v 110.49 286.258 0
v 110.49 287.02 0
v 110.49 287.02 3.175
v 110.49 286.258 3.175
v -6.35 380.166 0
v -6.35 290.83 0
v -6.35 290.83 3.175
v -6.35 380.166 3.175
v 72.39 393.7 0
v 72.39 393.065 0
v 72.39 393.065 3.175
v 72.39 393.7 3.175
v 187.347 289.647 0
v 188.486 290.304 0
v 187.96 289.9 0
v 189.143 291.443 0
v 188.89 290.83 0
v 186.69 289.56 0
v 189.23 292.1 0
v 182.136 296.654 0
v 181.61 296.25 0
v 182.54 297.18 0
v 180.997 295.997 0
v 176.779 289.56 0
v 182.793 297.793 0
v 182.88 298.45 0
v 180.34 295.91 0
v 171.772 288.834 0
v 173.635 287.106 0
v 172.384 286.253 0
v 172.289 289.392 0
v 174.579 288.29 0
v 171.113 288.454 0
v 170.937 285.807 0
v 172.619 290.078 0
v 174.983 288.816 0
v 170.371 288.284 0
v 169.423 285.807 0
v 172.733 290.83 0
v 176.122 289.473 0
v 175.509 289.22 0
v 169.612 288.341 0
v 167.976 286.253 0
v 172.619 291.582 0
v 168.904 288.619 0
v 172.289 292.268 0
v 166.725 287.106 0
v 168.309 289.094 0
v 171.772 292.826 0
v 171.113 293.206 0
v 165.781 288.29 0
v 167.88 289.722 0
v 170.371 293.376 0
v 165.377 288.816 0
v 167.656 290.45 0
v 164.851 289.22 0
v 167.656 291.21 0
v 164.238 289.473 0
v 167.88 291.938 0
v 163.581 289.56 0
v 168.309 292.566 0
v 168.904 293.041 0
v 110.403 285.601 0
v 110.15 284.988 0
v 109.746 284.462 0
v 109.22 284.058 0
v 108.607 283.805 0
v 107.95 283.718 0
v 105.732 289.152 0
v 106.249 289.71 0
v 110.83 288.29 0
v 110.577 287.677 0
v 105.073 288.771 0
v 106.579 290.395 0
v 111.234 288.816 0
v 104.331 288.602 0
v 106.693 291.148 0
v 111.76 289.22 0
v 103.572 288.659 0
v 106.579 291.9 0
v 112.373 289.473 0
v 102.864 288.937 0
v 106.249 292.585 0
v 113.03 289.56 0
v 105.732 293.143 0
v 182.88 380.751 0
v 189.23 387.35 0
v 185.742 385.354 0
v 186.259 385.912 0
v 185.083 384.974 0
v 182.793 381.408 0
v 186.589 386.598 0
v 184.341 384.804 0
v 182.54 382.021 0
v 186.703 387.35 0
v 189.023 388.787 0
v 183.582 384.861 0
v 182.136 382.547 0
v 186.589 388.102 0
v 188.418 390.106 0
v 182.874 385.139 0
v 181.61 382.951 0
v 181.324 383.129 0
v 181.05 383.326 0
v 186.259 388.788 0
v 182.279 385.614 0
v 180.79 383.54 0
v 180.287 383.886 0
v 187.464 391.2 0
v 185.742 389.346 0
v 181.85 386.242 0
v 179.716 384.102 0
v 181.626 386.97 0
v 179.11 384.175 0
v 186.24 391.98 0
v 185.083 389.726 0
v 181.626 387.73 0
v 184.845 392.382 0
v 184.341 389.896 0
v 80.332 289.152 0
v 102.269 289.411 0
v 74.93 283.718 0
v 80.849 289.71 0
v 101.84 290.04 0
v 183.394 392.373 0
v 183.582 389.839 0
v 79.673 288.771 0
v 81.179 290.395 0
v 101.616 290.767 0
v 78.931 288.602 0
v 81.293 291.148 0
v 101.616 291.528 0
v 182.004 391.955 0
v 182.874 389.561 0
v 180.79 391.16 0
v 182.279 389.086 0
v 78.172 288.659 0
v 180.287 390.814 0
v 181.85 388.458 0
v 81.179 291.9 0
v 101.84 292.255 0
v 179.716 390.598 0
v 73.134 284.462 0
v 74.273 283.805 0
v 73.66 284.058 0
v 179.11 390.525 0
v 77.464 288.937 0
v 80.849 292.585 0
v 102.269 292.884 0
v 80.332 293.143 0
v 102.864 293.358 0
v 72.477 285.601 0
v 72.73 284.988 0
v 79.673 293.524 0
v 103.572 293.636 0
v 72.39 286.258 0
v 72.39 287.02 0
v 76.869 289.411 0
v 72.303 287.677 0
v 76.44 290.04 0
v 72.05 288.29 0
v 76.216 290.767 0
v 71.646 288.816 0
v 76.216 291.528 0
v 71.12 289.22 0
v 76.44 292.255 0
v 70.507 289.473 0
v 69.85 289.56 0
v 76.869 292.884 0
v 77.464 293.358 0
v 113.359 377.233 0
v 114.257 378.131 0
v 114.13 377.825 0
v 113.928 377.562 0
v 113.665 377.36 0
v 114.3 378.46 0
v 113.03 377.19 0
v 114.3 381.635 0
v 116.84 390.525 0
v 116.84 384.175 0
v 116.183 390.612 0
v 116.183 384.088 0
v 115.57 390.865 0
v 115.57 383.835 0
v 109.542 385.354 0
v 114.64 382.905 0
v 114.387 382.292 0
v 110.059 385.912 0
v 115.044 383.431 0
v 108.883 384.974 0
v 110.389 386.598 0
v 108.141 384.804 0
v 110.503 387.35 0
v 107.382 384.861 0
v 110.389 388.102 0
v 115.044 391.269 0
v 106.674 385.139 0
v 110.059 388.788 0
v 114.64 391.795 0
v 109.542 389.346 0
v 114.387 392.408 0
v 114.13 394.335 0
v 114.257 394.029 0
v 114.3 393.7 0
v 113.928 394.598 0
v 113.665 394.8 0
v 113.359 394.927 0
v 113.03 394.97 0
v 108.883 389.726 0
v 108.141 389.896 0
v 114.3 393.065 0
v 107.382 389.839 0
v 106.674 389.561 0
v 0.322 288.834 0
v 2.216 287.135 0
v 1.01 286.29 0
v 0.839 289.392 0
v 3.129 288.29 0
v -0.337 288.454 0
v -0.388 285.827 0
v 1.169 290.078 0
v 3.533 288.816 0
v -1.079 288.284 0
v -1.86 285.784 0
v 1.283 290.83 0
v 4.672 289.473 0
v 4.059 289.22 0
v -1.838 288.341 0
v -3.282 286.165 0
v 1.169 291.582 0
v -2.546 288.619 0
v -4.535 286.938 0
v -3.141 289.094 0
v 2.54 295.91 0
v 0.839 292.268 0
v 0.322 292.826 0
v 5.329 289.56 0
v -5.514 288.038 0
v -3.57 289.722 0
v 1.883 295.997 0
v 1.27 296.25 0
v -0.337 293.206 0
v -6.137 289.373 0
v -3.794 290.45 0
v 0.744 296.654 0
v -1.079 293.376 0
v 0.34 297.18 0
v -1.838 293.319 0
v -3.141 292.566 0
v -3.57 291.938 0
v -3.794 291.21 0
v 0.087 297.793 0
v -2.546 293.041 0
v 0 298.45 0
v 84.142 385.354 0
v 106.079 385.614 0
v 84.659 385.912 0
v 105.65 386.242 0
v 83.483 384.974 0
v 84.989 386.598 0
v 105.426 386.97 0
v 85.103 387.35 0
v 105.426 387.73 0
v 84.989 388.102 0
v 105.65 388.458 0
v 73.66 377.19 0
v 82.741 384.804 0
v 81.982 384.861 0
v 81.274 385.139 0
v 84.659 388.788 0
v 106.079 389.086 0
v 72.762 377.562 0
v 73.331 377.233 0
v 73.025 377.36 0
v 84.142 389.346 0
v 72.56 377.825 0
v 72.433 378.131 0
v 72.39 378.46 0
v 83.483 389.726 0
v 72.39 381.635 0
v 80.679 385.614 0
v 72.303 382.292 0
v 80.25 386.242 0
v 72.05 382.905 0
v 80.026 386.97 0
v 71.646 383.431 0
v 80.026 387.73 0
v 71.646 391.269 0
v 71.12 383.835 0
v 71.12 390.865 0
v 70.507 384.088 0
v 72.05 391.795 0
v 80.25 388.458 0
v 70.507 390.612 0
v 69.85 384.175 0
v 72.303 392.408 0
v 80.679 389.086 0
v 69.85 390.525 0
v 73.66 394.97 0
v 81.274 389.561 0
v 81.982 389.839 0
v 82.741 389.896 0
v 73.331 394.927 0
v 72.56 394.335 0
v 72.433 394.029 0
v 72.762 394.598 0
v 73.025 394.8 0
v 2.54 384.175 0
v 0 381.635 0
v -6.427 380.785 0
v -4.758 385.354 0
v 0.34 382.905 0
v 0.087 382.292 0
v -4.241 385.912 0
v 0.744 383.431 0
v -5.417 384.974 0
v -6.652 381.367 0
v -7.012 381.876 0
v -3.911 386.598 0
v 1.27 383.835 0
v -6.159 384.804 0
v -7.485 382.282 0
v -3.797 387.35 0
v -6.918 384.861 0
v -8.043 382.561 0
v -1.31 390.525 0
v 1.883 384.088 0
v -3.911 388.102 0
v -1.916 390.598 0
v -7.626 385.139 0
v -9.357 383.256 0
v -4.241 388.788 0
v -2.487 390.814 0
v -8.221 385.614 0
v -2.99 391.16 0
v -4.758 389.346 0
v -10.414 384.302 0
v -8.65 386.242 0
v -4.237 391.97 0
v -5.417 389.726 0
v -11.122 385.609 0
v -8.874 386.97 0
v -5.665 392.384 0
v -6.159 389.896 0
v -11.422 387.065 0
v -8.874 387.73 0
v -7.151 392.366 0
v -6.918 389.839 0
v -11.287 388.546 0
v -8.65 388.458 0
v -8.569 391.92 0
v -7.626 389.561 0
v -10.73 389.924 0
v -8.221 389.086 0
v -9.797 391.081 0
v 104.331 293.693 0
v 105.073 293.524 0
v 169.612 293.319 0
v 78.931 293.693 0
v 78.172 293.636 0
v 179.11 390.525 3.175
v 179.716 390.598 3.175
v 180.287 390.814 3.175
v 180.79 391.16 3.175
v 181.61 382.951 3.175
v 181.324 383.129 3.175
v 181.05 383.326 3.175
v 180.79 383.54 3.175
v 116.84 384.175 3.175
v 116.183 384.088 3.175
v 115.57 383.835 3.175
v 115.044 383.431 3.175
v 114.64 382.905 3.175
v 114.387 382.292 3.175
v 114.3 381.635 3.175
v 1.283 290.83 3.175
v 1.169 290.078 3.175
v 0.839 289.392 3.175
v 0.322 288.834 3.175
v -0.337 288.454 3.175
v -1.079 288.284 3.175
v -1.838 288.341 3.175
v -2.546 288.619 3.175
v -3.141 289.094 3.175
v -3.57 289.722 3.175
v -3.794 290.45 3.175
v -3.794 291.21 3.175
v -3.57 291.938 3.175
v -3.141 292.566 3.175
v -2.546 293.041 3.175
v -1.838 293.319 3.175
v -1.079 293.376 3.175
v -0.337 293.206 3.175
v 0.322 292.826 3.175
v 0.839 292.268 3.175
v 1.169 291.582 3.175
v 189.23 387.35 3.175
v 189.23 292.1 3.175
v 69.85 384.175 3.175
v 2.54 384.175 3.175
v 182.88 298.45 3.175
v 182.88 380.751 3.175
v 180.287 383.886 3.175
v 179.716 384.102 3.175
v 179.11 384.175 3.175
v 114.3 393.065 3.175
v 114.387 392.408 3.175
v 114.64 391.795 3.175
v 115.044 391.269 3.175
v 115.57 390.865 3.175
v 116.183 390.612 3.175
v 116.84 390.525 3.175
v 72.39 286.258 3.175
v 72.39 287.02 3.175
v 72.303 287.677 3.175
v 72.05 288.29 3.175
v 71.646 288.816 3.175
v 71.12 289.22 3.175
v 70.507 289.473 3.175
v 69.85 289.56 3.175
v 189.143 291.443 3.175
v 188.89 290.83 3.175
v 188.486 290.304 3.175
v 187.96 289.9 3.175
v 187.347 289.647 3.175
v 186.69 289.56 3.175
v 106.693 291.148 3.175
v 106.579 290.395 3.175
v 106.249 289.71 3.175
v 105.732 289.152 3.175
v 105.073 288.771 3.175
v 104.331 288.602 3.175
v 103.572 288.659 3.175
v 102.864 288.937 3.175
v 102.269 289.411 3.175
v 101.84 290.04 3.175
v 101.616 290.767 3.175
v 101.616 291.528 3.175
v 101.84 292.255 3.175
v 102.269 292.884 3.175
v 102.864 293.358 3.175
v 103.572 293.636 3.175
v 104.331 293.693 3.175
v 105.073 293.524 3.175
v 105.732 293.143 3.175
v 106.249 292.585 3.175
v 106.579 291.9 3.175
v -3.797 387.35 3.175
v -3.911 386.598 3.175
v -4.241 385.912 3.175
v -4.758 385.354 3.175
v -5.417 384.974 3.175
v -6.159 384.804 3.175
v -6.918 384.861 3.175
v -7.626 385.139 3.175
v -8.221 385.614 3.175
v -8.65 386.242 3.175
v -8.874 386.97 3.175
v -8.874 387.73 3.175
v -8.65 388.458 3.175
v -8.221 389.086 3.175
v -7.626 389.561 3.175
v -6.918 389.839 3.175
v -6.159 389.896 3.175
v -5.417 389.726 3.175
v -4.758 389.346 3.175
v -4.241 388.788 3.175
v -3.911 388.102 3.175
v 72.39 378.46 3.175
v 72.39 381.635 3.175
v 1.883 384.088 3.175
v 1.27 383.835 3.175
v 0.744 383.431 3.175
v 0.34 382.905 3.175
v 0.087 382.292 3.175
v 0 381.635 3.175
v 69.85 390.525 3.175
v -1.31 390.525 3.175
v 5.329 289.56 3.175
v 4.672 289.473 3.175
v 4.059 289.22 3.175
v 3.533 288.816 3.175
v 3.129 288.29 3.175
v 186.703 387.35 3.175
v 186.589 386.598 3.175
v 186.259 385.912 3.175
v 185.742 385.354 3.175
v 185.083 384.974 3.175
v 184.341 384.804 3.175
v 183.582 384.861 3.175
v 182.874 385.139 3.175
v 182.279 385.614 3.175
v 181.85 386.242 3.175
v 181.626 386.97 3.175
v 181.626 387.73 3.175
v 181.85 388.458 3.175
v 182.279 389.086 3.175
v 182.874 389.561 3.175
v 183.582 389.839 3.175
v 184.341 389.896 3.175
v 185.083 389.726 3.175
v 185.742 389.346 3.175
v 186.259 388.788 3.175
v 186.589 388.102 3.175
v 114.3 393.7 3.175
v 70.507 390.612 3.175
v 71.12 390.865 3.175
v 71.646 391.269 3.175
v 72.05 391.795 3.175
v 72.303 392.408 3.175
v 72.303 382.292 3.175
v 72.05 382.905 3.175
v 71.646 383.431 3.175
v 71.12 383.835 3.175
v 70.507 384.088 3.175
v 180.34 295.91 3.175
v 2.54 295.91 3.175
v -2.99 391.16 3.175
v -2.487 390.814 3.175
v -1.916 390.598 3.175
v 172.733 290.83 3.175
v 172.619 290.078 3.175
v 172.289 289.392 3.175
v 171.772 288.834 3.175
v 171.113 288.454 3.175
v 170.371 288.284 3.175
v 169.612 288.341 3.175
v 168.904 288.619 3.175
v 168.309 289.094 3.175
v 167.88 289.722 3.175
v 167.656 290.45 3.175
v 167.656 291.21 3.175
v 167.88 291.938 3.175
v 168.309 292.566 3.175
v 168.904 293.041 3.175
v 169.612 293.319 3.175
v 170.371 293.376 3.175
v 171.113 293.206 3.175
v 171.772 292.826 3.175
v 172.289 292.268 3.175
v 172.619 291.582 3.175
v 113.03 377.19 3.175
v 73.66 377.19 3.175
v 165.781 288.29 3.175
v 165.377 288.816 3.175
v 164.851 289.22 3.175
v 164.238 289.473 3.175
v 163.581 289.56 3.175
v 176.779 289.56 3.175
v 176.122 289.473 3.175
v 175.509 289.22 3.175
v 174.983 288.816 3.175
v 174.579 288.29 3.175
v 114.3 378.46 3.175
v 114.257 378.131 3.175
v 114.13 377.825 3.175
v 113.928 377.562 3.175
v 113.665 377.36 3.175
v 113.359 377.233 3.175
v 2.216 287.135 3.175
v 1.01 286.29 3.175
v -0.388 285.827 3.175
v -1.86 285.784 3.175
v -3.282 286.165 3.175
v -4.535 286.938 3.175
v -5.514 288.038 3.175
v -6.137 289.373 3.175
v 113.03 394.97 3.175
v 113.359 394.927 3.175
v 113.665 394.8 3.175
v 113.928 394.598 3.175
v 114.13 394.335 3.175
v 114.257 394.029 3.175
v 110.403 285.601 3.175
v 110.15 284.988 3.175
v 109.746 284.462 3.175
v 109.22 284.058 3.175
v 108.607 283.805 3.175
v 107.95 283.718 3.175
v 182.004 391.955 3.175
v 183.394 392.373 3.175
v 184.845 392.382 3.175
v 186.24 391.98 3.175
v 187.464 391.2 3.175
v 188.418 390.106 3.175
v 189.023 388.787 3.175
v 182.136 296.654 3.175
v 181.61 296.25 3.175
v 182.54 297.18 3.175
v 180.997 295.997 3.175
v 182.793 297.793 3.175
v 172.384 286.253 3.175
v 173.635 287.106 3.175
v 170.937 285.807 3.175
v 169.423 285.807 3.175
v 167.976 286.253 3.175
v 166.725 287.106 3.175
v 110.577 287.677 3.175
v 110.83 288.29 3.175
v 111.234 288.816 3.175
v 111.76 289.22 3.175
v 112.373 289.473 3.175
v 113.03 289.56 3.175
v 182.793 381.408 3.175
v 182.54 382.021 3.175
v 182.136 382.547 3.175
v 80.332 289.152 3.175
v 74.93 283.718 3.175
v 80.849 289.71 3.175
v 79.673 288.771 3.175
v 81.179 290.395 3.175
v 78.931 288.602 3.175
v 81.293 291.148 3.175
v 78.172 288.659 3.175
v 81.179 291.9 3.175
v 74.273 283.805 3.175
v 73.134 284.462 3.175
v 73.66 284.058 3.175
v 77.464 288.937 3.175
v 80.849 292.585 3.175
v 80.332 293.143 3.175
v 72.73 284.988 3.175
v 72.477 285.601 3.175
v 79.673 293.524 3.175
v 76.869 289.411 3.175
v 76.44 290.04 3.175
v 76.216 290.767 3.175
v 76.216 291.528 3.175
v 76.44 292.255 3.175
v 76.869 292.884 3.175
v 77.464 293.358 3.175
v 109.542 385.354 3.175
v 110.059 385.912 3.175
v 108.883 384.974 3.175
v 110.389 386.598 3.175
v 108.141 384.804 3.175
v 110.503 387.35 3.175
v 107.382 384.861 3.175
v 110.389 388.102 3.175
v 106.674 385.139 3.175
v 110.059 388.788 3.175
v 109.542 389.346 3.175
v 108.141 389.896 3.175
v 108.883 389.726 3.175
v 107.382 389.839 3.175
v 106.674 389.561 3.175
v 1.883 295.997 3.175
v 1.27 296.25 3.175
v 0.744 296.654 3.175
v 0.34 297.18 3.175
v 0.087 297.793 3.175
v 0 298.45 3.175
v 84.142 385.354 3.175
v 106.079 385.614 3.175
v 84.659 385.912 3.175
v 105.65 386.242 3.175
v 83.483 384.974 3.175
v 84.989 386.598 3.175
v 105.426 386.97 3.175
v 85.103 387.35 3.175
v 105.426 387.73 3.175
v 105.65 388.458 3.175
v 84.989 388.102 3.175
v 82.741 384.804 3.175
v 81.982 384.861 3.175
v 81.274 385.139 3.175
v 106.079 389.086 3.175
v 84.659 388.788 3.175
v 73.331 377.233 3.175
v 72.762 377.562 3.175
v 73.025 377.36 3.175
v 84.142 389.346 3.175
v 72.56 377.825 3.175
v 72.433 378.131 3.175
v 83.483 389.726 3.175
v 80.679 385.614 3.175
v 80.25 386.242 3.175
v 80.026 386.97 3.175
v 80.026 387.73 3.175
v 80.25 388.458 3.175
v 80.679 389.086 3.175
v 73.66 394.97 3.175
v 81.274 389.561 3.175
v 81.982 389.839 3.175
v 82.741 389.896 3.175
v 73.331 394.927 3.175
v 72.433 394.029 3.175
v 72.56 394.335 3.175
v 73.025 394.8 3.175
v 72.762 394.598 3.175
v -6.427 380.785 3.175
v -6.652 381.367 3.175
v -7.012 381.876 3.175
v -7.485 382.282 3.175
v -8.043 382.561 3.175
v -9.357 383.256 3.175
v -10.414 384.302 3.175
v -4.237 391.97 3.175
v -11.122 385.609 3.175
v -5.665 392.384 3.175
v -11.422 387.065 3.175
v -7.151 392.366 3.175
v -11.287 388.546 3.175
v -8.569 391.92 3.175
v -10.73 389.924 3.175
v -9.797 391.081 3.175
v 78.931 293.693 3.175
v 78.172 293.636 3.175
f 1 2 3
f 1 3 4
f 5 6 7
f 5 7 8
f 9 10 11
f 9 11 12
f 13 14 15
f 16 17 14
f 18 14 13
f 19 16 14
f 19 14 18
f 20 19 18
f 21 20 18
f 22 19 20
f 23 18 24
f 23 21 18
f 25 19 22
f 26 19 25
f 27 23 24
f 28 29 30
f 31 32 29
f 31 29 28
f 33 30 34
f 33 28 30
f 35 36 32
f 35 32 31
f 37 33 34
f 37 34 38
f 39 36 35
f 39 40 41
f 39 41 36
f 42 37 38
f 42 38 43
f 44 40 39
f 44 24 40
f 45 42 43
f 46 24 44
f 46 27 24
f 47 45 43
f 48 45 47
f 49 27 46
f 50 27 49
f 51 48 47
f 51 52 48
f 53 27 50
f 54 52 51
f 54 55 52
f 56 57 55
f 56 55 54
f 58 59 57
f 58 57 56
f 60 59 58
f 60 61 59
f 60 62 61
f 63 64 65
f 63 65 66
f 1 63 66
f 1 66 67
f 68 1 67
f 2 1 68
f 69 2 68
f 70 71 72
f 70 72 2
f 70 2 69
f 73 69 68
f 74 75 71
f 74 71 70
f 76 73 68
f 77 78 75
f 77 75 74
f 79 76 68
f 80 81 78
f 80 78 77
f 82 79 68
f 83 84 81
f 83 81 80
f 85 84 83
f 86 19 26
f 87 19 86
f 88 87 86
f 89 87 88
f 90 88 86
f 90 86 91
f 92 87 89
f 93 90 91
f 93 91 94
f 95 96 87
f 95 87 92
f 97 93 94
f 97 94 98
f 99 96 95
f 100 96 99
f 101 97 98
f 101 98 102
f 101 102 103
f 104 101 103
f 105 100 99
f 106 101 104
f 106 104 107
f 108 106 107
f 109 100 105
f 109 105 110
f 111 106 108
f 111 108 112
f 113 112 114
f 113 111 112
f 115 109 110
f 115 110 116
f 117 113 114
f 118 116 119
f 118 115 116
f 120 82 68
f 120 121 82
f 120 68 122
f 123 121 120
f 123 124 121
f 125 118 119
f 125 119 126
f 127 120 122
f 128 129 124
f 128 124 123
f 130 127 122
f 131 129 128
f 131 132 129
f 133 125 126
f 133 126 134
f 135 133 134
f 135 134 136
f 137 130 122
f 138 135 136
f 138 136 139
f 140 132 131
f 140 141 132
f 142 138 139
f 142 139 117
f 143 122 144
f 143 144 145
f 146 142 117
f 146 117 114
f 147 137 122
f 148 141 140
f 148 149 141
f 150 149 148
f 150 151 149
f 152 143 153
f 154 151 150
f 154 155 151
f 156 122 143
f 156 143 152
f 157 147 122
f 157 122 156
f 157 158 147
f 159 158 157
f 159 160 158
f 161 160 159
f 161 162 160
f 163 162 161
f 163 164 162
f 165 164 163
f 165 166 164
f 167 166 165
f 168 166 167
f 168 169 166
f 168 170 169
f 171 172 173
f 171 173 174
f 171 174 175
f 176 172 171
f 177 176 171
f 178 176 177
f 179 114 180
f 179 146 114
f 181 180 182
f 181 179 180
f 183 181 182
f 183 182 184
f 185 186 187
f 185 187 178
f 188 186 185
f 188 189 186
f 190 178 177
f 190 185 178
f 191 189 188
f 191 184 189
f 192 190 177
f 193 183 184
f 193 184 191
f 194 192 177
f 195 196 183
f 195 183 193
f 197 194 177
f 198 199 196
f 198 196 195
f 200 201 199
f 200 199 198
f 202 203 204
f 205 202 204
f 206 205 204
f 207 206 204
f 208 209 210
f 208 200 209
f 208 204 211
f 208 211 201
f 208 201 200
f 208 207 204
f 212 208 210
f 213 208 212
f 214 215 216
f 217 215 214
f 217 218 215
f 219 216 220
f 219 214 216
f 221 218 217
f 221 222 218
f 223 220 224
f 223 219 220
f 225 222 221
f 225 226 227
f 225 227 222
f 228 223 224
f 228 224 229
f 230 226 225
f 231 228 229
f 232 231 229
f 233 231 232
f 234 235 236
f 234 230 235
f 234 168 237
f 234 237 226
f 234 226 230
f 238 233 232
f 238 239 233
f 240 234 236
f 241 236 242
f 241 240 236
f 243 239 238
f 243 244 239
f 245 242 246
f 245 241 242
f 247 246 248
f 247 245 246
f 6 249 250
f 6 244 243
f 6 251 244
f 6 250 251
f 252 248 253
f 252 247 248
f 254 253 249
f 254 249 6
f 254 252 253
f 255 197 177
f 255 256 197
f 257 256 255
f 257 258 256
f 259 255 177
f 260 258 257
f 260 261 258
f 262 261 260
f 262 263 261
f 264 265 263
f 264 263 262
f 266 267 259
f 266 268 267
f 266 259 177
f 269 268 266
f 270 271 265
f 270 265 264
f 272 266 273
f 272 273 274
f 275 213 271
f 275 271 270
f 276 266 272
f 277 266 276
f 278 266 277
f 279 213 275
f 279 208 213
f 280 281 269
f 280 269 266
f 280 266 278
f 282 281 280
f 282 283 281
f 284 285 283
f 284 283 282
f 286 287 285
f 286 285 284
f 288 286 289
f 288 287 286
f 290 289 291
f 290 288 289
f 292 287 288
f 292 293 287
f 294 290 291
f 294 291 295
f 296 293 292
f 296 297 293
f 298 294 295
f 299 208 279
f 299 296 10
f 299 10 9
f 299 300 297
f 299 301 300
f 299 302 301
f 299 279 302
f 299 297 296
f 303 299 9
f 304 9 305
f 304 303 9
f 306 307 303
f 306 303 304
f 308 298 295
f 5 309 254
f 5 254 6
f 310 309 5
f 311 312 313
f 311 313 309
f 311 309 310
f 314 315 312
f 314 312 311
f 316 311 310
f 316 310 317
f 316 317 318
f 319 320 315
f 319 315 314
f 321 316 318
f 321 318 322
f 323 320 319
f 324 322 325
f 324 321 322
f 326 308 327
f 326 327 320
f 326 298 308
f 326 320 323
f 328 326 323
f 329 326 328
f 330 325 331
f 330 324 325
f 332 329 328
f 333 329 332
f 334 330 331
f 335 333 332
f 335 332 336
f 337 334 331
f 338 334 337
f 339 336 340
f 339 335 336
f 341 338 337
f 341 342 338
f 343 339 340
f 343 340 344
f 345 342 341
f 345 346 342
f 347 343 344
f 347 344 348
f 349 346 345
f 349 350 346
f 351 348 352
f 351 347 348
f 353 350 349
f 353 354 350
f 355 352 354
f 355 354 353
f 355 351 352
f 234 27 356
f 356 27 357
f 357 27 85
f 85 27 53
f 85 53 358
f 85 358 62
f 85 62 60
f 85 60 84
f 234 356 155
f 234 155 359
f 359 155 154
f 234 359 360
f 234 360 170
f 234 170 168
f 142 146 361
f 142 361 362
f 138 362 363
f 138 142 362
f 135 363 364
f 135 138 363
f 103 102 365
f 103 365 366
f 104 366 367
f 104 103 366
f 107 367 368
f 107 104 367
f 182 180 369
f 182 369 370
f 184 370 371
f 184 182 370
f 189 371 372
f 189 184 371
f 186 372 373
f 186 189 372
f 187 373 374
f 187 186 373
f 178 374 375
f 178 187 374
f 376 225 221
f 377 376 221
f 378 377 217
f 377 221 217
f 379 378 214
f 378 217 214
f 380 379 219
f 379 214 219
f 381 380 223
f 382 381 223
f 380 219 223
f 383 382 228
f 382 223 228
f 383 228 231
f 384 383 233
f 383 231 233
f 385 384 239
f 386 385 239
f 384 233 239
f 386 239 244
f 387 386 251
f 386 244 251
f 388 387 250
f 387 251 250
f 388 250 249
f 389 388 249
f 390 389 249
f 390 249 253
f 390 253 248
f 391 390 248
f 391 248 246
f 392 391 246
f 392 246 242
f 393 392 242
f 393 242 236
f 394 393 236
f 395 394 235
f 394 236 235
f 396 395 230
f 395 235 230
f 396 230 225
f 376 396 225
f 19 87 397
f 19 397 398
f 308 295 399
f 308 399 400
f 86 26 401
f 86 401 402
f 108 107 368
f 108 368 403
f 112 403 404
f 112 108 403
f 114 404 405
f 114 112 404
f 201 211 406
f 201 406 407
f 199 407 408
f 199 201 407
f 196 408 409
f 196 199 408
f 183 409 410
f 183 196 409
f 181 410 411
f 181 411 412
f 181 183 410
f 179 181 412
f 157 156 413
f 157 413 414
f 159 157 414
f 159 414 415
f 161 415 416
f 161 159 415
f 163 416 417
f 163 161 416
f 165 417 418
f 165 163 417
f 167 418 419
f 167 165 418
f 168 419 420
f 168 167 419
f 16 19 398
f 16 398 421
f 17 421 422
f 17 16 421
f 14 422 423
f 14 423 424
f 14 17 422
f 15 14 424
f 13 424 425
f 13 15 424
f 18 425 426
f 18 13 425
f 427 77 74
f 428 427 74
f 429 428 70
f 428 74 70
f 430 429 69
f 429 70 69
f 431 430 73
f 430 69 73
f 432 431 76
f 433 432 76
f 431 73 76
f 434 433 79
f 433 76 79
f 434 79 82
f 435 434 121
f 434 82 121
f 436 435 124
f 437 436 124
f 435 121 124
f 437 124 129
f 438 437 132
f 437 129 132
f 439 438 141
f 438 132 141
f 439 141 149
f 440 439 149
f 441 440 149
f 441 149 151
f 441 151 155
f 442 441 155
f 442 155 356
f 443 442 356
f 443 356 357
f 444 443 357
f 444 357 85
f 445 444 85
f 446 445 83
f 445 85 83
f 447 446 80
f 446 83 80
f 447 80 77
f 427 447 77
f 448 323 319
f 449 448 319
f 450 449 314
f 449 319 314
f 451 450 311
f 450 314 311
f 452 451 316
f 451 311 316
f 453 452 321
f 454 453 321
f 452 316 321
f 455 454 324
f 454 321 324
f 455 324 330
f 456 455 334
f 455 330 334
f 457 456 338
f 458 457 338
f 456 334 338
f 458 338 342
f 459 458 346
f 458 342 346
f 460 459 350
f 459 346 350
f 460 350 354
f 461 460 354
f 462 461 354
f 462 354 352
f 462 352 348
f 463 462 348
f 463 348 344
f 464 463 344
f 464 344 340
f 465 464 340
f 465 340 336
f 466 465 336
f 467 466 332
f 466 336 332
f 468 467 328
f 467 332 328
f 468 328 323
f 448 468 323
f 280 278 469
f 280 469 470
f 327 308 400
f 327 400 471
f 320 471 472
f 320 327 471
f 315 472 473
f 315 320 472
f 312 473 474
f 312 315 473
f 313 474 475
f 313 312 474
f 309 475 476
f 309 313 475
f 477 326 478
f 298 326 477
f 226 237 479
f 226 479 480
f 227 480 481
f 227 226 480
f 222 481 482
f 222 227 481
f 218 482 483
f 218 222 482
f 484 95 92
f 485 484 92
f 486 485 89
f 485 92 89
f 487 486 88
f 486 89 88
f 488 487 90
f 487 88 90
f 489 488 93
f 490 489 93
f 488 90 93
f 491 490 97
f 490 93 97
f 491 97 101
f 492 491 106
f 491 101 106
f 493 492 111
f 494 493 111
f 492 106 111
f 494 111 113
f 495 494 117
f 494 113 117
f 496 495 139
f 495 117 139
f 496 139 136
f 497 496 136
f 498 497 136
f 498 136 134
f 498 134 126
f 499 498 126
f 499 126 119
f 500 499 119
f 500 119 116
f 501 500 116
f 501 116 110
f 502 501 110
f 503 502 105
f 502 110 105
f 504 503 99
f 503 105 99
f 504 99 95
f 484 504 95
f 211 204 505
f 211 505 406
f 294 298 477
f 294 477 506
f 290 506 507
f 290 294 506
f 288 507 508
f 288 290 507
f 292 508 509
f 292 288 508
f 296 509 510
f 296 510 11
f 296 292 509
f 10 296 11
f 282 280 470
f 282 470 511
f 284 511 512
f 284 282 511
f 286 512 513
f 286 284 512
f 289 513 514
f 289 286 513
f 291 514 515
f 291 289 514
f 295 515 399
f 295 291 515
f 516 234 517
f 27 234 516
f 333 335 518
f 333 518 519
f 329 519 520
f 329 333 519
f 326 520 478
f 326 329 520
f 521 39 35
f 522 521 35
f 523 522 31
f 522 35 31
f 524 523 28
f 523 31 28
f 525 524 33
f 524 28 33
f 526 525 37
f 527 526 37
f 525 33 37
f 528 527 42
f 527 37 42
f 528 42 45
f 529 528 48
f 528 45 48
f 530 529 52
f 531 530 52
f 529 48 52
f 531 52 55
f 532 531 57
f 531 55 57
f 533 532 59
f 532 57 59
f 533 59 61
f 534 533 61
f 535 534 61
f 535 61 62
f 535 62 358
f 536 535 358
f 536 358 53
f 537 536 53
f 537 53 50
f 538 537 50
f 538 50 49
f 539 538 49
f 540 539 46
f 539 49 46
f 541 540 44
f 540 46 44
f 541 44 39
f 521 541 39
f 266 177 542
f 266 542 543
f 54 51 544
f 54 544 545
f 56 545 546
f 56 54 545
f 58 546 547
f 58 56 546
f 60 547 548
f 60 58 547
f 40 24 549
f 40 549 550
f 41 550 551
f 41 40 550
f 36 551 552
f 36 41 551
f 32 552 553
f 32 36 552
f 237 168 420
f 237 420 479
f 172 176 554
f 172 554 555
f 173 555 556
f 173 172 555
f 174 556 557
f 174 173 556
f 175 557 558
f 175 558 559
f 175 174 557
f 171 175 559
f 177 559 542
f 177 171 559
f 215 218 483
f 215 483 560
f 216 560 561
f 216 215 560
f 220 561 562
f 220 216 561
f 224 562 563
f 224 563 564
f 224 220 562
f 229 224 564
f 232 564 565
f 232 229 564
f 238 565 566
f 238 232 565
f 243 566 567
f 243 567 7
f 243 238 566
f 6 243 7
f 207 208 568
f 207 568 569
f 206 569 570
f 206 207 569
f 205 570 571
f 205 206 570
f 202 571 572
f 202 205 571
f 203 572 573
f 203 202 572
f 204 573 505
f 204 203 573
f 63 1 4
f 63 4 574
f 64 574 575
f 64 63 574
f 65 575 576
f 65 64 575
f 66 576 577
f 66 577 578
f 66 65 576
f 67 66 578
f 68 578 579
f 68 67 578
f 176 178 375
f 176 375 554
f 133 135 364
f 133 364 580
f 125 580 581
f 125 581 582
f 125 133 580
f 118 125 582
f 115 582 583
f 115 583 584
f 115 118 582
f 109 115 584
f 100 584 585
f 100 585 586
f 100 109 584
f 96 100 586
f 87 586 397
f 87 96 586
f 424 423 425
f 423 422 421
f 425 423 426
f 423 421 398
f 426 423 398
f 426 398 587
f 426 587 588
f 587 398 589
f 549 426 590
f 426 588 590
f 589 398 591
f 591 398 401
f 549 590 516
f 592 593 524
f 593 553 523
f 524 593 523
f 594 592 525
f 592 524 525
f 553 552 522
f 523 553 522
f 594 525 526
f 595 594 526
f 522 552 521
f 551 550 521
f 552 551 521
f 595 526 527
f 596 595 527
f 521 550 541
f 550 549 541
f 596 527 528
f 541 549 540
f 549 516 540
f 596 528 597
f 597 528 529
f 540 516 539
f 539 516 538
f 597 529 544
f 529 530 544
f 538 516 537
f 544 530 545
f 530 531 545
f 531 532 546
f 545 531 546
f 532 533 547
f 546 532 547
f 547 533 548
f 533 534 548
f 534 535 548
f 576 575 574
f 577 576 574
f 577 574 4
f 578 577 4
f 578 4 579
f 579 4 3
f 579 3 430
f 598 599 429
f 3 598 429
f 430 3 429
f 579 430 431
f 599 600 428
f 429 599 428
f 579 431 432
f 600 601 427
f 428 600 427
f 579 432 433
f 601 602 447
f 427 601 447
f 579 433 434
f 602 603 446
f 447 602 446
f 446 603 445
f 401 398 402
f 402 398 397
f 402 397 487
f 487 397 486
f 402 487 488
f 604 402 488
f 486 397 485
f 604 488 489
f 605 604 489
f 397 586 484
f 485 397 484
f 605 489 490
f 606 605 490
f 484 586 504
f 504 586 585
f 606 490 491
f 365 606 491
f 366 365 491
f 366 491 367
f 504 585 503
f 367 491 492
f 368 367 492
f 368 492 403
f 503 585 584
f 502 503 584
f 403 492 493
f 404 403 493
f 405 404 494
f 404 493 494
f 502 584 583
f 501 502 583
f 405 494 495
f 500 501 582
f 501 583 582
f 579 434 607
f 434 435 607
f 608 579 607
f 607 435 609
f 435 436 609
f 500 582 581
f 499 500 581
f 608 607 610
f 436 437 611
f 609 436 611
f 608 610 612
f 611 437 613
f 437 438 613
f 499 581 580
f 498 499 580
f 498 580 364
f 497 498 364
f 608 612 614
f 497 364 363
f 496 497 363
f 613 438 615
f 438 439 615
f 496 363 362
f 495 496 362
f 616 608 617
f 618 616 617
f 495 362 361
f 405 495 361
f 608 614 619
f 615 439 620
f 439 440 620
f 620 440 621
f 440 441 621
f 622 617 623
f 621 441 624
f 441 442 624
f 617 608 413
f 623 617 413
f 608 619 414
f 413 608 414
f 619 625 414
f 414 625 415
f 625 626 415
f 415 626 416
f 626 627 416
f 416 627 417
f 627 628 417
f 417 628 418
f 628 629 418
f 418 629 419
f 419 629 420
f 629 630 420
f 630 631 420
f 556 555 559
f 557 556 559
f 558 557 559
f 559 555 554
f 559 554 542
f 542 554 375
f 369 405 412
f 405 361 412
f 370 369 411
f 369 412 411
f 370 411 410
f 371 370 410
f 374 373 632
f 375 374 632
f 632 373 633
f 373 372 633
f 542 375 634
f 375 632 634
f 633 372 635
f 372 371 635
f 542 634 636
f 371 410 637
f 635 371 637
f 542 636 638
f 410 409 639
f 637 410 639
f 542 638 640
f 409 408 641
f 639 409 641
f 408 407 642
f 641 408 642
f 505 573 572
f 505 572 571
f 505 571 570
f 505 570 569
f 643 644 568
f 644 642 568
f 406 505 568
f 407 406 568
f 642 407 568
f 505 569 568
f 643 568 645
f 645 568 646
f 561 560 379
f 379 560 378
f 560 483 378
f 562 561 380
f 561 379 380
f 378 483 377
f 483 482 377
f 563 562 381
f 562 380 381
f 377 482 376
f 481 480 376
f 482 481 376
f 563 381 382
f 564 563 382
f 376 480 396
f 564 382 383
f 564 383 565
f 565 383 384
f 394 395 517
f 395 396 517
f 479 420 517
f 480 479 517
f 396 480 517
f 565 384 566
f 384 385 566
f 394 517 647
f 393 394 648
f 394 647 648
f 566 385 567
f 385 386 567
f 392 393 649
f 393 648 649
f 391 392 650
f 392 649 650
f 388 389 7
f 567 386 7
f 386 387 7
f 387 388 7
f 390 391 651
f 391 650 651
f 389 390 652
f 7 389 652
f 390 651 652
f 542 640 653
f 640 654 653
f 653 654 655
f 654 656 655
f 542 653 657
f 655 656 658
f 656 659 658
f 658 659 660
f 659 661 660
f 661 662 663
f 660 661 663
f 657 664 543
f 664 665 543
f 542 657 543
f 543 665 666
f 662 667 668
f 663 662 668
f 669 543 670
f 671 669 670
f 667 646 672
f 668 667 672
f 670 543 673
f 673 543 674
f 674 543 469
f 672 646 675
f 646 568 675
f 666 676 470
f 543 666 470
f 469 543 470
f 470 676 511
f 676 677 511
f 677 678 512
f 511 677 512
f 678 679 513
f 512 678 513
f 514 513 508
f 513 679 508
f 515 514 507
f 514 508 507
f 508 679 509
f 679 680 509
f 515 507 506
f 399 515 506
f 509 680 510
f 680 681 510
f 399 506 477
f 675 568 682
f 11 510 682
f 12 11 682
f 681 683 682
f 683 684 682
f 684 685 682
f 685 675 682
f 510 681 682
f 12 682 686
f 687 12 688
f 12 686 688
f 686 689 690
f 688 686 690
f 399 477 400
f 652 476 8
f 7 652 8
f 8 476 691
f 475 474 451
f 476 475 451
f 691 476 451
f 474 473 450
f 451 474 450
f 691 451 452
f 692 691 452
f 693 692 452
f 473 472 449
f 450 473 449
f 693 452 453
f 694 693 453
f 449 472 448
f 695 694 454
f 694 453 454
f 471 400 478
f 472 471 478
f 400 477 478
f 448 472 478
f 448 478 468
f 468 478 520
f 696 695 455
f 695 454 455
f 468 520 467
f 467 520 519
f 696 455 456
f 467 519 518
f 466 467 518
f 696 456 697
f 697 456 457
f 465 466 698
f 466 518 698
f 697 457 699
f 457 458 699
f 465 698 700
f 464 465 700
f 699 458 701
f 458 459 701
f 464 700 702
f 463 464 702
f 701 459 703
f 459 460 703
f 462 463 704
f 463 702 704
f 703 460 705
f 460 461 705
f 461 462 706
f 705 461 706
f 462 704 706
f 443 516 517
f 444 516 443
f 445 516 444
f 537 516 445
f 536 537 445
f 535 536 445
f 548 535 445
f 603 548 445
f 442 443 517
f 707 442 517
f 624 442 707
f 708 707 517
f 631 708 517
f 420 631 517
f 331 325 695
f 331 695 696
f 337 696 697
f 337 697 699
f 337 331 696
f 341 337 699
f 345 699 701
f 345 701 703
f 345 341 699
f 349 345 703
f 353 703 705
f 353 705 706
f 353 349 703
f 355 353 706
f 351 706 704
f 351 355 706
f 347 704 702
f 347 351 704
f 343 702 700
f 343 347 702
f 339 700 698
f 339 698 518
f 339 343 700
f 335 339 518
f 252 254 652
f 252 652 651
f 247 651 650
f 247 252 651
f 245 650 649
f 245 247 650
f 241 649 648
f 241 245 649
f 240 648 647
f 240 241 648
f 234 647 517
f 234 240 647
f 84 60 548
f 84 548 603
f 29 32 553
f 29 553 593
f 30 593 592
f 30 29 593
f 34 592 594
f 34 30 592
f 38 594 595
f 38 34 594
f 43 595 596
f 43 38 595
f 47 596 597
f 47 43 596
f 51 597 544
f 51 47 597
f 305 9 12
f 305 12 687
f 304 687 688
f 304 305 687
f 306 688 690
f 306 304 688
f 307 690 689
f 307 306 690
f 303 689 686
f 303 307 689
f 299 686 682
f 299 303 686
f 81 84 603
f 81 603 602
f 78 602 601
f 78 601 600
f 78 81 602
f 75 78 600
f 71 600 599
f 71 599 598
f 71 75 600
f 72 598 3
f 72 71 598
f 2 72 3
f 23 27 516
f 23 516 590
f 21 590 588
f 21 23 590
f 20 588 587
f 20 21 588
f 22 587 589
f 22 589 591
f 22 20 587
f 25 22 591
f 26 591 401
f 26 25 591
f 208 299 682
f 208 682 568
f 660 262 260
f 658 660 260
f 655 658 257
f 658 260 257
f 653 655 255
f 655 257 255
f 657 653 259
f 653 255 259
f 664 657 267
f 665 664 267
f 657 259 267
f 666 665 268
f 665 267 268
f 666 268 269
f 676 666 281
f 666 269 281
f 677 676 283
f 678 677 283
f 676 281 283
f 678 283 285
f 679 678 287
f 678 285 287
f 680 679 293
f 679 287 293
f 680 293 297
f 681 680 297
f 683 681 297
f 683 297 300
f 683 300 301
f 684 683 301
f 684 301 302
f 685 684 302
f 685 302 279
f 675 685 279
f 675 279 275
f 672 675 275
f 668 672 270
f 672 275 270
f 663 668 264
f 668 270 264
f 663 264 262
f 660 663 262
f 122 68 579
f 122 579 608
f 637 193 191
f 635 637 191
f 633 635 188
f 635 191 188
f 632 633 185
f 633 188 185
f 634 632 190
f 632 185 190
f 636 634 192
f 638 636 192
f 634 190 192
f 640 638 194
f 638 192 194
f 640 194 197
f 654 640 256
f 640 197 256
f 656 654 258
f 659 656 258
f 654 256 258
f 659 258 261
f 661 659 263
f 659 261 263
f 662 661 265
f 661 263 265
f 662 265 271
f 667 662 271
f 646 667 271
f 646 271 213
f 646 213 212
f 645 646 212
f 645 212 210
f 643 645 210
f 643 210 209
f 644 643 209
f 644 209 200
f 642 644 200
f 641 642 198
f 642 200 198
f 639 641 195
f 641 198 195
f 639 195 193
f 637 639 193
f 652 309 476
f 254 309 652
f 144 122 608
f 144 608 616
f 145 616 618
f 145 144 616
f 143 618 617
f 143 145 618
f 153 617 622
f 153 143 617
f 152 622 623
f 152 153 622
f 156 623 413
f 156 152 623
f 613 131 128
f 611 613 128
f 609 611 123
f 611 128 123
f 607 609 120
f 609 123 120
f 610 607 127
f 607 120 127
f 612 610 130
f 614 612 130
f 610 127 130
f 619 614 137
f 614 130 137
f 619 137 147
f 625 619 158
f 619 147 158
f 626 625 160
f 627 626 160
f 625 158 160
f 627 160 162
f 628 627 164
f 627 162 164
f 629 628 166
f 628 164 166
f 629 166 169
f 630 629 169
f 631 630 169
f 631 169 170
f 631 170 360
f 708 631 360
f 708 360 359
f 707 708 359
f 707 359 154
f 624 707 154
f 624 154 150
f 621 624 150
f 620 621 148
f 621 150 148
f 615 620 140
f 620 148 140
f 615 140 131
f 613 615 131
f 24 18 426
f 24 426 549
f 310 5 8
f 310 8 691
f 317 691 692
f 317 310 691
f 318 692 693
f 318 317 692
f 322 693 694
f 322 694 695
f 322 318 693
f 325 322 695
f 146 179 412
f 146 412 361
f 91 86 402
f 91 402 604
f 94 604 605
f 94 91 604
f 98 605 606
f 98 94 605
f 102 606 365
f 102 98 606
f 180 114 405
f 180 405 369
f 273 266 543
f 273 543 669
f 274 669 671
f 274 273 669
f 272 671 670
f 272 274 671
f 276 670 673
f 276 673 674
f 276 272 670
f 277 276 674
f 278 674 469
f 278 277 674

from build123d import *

# Parameters (mm, degrees)
SKETCH1_R           = 2.5527
BOSS_EXTRUDE1_DEPTH = 3.175


with BuildPart() as part:
    # Sketch1 → Boss-Extrude1 (new body)
    with BuildSketch(Plane(origin=(0, 0, 0), x_dir=(-1, 0, 0), z_dir=(0, 0, -1))):
        with BuildLine():
            Line((-73.66, 394.97), (-113.03, 394.97))
            ThreePointArc((-113.03, 394.97), (-113.928025612, 394.598025612), (-114.3, 393.7))
            Line((-114.3, 393.7), (-114.3, 393.065))
            ThreePointArc((-114.3, 393.065), (-115.043948776, 391.268948776), (-116.84, 390.525))
            Line((-116.84, 390.525), (-179.109843752, 390.525))
            ThreePointArc((-179.109843752, 390.525), (-180.007869365, 390.689047559), (-180.789895835, 391.16))
            ThreePointArc((-180.789895835, 391.16), (-186.240104165, 391.980104165), (-189.23, 387.35))
            Line((-189.23, 387.35), (-189.23, 292.1))
            ThreePointArc((-189.23, 292.1), (-188.486051224, 290.303948776), (-186.69, 289.56))
            Line((-186.69, 289.56), (-176.779113577, 289.56))
            ThreePointArc((-176.779113577, 289.56), (-175.509113577, 289.219704526), (-174.579409051, 288.29))
            ThreePointArc((-174.579409051, 288.29), (-170.18, 285.75), (-165.780590949, 288.29))
            ThreePointArc((-165.780590949, 288.29), (-164.850886423, 289.219704526), (-163.580886423, 289.56))
            Line((-163.580886423, 289.56), (-113.03, 289.56))
            ThreePointArc((-113.03, 289.56), (-111.233948776, 288.816051224), (-110.49, 287.02))
            Line((-110.49, 287.02), (-110.49, 286.258))
            ThreePointArc((-110.49, 286.258), (-109.746051224, 284.461948776), (-107.95, 283.718))
            Line((-107.95, 283.718), (-74.93, 283.718))
            ThreePointArc((-74.93, 283.718), (-73.133948776, 284.461948776), (-72.39, 286.258))
            Line((-72.39, 286.258), (-72.39, 287.02))
            ThreePointArc((-72.39, 287.02), (-71.646051224, 288.816051224), (-69.85, 289.56))
            Line((-69.85, 289.56), (-5.329113577, 289.56))
            ThreePointArc((-5.329113577, 289.56), (-4.059113577, 289.219704526), (-3.129409051, 288.29))
            ThreePointArc((-3.129409051, 288.29), (2.584800749, 285.923096802), (6.35, 290.83))
            Line((6.35, 290.83), (6.35, 380.165795103))
            ThreePointArc((6.35, 380.165795103), (6.816098684, 381.632264787), (8.043333333, 382.560530069))
            ThreePointArc((8.043333333, 382.560530069), (10.729754791, 389.923742018), (2.989895835, 391.16))
            ThreePointArc((2.989895835, 391.16), (2.207869365, 390.689047559), (1.309843752, 390.525))
            Line((1.309843752, 390.525), (-69.85, 390.525))
            ThreePointArc((-69.85, 390.525), (-71.646051224, 391.268948776), (-72.39, 393.065))
            Line((-72.39, 393.065), (-72.39, 393.7))
            ThreePointArc((-72.39, 393.7), (-72.761974388, 394.598025612), (-73.66, 394.97))
        make_face()
        with Locations(Location((-184.15, 387.35, 0), (0, 0, 180))):
            Circle(SKETCH1_R, mode=Mode.SUBTRACT)
        with Locations(Location((-107.95, 387.35, 0), (0, 0, 180))):
            Circle(SKETCH1_R, mode=Mode.SUBTRACT)
        with Locations(Location((-82.55, 387.35, 0), (0, 0, 180))):
            Circle(SKETCH1_R, mode=Mode.SUBTRACT)
        with Locations(Location((1.27, 290.83, 0), (0, 0, 180))):
            Circle(SKETCH1_R, mode=Mode.SUBTRACT)
        with Locations(Location((-104.14, 291.1475, 0), (0, 0, 180))):
            Circle(SKETCH1_R, mode=Mode.SUBTRACT)
        with Locations(Location((-78.74, 291.1475, 0), (0, 0, 180))):
            Circle(SKETCH1_R, mode=Mode.SUBTRACT)
        with Locations(Location((6.35, 387.35, 0), (0, 0, 180))):
            Circle(SKETCH1_R, mode=Mode.SUBTRACT)
        with Locations(Location((-170.18, 290.83, 0), (0, 0, 180))):
            Circle(SKETCH1_R, mode=Mode.SUBTRACT)
        with BuildLine():
            Line((-72.39, 378.46), (-72.39, 381.635))
            ThreePointArc((-72.39, 381.635), (-71.646051224, 383.431051224), (-69.85, 384.175))
            Line((-69.85, 384.175), (-2.54, 384.175))
            ThreePointArc((-2.54, 384.175), (-0.743948776, 383.431051224), (0, 381.635))
            Line((0, 381.635), (0, 298.45))
            ThreePointArc((0, 298.45), (-0.743948776, 296.653948776), (-2.54, 295.91))
            Line((-2.54, 295.91), (-180.34, 295.91))
            ThreePointArc((-180.34, 295.91), (-182.136051224, 296.653948776), (-182.88, 298.45))
            Line((-182.88, 298.45), (-182.88, 380.750886423))
            ThreePointArc((-182.88, 380.750886423), (-182.539704526, 382.020886423), (-181.61, 382.950590949))
            ThreePointArc((-181.61, 382.950590949), (-181.185264253, 383.224864614), (-180.789895835, 383.54))
            ThreePointArc((-180.789895835, 383.54), (-180.007869365, 384.010952441), (-179.109843752, 384.175))
            Line((-179.109843752, 384.175), (-116.84, 384.175))
            ThreePointArc((-116.84, 384.175), (-115.043948776, 383.431051224), (-114.3, 381.635))
            Line((-114.3, 381.635), (-114.3, 378.46))
            ThreePointArc((-114.3, 378.46), (-113.928025612, 377.561974388), (-113.03, 377.19))
            Line((-113.03, 377.19), (-73.66, 377.19))
            ThreePointArc((-73.66, 377.19), (-72.761974388, 377.561974388), (-72.39, 378.46))
        make_face(mode=Mode.SUBTRACT)
    extrude(amount=-BOSS_EXTRUDE1_DEPTH)


solid = part.part
